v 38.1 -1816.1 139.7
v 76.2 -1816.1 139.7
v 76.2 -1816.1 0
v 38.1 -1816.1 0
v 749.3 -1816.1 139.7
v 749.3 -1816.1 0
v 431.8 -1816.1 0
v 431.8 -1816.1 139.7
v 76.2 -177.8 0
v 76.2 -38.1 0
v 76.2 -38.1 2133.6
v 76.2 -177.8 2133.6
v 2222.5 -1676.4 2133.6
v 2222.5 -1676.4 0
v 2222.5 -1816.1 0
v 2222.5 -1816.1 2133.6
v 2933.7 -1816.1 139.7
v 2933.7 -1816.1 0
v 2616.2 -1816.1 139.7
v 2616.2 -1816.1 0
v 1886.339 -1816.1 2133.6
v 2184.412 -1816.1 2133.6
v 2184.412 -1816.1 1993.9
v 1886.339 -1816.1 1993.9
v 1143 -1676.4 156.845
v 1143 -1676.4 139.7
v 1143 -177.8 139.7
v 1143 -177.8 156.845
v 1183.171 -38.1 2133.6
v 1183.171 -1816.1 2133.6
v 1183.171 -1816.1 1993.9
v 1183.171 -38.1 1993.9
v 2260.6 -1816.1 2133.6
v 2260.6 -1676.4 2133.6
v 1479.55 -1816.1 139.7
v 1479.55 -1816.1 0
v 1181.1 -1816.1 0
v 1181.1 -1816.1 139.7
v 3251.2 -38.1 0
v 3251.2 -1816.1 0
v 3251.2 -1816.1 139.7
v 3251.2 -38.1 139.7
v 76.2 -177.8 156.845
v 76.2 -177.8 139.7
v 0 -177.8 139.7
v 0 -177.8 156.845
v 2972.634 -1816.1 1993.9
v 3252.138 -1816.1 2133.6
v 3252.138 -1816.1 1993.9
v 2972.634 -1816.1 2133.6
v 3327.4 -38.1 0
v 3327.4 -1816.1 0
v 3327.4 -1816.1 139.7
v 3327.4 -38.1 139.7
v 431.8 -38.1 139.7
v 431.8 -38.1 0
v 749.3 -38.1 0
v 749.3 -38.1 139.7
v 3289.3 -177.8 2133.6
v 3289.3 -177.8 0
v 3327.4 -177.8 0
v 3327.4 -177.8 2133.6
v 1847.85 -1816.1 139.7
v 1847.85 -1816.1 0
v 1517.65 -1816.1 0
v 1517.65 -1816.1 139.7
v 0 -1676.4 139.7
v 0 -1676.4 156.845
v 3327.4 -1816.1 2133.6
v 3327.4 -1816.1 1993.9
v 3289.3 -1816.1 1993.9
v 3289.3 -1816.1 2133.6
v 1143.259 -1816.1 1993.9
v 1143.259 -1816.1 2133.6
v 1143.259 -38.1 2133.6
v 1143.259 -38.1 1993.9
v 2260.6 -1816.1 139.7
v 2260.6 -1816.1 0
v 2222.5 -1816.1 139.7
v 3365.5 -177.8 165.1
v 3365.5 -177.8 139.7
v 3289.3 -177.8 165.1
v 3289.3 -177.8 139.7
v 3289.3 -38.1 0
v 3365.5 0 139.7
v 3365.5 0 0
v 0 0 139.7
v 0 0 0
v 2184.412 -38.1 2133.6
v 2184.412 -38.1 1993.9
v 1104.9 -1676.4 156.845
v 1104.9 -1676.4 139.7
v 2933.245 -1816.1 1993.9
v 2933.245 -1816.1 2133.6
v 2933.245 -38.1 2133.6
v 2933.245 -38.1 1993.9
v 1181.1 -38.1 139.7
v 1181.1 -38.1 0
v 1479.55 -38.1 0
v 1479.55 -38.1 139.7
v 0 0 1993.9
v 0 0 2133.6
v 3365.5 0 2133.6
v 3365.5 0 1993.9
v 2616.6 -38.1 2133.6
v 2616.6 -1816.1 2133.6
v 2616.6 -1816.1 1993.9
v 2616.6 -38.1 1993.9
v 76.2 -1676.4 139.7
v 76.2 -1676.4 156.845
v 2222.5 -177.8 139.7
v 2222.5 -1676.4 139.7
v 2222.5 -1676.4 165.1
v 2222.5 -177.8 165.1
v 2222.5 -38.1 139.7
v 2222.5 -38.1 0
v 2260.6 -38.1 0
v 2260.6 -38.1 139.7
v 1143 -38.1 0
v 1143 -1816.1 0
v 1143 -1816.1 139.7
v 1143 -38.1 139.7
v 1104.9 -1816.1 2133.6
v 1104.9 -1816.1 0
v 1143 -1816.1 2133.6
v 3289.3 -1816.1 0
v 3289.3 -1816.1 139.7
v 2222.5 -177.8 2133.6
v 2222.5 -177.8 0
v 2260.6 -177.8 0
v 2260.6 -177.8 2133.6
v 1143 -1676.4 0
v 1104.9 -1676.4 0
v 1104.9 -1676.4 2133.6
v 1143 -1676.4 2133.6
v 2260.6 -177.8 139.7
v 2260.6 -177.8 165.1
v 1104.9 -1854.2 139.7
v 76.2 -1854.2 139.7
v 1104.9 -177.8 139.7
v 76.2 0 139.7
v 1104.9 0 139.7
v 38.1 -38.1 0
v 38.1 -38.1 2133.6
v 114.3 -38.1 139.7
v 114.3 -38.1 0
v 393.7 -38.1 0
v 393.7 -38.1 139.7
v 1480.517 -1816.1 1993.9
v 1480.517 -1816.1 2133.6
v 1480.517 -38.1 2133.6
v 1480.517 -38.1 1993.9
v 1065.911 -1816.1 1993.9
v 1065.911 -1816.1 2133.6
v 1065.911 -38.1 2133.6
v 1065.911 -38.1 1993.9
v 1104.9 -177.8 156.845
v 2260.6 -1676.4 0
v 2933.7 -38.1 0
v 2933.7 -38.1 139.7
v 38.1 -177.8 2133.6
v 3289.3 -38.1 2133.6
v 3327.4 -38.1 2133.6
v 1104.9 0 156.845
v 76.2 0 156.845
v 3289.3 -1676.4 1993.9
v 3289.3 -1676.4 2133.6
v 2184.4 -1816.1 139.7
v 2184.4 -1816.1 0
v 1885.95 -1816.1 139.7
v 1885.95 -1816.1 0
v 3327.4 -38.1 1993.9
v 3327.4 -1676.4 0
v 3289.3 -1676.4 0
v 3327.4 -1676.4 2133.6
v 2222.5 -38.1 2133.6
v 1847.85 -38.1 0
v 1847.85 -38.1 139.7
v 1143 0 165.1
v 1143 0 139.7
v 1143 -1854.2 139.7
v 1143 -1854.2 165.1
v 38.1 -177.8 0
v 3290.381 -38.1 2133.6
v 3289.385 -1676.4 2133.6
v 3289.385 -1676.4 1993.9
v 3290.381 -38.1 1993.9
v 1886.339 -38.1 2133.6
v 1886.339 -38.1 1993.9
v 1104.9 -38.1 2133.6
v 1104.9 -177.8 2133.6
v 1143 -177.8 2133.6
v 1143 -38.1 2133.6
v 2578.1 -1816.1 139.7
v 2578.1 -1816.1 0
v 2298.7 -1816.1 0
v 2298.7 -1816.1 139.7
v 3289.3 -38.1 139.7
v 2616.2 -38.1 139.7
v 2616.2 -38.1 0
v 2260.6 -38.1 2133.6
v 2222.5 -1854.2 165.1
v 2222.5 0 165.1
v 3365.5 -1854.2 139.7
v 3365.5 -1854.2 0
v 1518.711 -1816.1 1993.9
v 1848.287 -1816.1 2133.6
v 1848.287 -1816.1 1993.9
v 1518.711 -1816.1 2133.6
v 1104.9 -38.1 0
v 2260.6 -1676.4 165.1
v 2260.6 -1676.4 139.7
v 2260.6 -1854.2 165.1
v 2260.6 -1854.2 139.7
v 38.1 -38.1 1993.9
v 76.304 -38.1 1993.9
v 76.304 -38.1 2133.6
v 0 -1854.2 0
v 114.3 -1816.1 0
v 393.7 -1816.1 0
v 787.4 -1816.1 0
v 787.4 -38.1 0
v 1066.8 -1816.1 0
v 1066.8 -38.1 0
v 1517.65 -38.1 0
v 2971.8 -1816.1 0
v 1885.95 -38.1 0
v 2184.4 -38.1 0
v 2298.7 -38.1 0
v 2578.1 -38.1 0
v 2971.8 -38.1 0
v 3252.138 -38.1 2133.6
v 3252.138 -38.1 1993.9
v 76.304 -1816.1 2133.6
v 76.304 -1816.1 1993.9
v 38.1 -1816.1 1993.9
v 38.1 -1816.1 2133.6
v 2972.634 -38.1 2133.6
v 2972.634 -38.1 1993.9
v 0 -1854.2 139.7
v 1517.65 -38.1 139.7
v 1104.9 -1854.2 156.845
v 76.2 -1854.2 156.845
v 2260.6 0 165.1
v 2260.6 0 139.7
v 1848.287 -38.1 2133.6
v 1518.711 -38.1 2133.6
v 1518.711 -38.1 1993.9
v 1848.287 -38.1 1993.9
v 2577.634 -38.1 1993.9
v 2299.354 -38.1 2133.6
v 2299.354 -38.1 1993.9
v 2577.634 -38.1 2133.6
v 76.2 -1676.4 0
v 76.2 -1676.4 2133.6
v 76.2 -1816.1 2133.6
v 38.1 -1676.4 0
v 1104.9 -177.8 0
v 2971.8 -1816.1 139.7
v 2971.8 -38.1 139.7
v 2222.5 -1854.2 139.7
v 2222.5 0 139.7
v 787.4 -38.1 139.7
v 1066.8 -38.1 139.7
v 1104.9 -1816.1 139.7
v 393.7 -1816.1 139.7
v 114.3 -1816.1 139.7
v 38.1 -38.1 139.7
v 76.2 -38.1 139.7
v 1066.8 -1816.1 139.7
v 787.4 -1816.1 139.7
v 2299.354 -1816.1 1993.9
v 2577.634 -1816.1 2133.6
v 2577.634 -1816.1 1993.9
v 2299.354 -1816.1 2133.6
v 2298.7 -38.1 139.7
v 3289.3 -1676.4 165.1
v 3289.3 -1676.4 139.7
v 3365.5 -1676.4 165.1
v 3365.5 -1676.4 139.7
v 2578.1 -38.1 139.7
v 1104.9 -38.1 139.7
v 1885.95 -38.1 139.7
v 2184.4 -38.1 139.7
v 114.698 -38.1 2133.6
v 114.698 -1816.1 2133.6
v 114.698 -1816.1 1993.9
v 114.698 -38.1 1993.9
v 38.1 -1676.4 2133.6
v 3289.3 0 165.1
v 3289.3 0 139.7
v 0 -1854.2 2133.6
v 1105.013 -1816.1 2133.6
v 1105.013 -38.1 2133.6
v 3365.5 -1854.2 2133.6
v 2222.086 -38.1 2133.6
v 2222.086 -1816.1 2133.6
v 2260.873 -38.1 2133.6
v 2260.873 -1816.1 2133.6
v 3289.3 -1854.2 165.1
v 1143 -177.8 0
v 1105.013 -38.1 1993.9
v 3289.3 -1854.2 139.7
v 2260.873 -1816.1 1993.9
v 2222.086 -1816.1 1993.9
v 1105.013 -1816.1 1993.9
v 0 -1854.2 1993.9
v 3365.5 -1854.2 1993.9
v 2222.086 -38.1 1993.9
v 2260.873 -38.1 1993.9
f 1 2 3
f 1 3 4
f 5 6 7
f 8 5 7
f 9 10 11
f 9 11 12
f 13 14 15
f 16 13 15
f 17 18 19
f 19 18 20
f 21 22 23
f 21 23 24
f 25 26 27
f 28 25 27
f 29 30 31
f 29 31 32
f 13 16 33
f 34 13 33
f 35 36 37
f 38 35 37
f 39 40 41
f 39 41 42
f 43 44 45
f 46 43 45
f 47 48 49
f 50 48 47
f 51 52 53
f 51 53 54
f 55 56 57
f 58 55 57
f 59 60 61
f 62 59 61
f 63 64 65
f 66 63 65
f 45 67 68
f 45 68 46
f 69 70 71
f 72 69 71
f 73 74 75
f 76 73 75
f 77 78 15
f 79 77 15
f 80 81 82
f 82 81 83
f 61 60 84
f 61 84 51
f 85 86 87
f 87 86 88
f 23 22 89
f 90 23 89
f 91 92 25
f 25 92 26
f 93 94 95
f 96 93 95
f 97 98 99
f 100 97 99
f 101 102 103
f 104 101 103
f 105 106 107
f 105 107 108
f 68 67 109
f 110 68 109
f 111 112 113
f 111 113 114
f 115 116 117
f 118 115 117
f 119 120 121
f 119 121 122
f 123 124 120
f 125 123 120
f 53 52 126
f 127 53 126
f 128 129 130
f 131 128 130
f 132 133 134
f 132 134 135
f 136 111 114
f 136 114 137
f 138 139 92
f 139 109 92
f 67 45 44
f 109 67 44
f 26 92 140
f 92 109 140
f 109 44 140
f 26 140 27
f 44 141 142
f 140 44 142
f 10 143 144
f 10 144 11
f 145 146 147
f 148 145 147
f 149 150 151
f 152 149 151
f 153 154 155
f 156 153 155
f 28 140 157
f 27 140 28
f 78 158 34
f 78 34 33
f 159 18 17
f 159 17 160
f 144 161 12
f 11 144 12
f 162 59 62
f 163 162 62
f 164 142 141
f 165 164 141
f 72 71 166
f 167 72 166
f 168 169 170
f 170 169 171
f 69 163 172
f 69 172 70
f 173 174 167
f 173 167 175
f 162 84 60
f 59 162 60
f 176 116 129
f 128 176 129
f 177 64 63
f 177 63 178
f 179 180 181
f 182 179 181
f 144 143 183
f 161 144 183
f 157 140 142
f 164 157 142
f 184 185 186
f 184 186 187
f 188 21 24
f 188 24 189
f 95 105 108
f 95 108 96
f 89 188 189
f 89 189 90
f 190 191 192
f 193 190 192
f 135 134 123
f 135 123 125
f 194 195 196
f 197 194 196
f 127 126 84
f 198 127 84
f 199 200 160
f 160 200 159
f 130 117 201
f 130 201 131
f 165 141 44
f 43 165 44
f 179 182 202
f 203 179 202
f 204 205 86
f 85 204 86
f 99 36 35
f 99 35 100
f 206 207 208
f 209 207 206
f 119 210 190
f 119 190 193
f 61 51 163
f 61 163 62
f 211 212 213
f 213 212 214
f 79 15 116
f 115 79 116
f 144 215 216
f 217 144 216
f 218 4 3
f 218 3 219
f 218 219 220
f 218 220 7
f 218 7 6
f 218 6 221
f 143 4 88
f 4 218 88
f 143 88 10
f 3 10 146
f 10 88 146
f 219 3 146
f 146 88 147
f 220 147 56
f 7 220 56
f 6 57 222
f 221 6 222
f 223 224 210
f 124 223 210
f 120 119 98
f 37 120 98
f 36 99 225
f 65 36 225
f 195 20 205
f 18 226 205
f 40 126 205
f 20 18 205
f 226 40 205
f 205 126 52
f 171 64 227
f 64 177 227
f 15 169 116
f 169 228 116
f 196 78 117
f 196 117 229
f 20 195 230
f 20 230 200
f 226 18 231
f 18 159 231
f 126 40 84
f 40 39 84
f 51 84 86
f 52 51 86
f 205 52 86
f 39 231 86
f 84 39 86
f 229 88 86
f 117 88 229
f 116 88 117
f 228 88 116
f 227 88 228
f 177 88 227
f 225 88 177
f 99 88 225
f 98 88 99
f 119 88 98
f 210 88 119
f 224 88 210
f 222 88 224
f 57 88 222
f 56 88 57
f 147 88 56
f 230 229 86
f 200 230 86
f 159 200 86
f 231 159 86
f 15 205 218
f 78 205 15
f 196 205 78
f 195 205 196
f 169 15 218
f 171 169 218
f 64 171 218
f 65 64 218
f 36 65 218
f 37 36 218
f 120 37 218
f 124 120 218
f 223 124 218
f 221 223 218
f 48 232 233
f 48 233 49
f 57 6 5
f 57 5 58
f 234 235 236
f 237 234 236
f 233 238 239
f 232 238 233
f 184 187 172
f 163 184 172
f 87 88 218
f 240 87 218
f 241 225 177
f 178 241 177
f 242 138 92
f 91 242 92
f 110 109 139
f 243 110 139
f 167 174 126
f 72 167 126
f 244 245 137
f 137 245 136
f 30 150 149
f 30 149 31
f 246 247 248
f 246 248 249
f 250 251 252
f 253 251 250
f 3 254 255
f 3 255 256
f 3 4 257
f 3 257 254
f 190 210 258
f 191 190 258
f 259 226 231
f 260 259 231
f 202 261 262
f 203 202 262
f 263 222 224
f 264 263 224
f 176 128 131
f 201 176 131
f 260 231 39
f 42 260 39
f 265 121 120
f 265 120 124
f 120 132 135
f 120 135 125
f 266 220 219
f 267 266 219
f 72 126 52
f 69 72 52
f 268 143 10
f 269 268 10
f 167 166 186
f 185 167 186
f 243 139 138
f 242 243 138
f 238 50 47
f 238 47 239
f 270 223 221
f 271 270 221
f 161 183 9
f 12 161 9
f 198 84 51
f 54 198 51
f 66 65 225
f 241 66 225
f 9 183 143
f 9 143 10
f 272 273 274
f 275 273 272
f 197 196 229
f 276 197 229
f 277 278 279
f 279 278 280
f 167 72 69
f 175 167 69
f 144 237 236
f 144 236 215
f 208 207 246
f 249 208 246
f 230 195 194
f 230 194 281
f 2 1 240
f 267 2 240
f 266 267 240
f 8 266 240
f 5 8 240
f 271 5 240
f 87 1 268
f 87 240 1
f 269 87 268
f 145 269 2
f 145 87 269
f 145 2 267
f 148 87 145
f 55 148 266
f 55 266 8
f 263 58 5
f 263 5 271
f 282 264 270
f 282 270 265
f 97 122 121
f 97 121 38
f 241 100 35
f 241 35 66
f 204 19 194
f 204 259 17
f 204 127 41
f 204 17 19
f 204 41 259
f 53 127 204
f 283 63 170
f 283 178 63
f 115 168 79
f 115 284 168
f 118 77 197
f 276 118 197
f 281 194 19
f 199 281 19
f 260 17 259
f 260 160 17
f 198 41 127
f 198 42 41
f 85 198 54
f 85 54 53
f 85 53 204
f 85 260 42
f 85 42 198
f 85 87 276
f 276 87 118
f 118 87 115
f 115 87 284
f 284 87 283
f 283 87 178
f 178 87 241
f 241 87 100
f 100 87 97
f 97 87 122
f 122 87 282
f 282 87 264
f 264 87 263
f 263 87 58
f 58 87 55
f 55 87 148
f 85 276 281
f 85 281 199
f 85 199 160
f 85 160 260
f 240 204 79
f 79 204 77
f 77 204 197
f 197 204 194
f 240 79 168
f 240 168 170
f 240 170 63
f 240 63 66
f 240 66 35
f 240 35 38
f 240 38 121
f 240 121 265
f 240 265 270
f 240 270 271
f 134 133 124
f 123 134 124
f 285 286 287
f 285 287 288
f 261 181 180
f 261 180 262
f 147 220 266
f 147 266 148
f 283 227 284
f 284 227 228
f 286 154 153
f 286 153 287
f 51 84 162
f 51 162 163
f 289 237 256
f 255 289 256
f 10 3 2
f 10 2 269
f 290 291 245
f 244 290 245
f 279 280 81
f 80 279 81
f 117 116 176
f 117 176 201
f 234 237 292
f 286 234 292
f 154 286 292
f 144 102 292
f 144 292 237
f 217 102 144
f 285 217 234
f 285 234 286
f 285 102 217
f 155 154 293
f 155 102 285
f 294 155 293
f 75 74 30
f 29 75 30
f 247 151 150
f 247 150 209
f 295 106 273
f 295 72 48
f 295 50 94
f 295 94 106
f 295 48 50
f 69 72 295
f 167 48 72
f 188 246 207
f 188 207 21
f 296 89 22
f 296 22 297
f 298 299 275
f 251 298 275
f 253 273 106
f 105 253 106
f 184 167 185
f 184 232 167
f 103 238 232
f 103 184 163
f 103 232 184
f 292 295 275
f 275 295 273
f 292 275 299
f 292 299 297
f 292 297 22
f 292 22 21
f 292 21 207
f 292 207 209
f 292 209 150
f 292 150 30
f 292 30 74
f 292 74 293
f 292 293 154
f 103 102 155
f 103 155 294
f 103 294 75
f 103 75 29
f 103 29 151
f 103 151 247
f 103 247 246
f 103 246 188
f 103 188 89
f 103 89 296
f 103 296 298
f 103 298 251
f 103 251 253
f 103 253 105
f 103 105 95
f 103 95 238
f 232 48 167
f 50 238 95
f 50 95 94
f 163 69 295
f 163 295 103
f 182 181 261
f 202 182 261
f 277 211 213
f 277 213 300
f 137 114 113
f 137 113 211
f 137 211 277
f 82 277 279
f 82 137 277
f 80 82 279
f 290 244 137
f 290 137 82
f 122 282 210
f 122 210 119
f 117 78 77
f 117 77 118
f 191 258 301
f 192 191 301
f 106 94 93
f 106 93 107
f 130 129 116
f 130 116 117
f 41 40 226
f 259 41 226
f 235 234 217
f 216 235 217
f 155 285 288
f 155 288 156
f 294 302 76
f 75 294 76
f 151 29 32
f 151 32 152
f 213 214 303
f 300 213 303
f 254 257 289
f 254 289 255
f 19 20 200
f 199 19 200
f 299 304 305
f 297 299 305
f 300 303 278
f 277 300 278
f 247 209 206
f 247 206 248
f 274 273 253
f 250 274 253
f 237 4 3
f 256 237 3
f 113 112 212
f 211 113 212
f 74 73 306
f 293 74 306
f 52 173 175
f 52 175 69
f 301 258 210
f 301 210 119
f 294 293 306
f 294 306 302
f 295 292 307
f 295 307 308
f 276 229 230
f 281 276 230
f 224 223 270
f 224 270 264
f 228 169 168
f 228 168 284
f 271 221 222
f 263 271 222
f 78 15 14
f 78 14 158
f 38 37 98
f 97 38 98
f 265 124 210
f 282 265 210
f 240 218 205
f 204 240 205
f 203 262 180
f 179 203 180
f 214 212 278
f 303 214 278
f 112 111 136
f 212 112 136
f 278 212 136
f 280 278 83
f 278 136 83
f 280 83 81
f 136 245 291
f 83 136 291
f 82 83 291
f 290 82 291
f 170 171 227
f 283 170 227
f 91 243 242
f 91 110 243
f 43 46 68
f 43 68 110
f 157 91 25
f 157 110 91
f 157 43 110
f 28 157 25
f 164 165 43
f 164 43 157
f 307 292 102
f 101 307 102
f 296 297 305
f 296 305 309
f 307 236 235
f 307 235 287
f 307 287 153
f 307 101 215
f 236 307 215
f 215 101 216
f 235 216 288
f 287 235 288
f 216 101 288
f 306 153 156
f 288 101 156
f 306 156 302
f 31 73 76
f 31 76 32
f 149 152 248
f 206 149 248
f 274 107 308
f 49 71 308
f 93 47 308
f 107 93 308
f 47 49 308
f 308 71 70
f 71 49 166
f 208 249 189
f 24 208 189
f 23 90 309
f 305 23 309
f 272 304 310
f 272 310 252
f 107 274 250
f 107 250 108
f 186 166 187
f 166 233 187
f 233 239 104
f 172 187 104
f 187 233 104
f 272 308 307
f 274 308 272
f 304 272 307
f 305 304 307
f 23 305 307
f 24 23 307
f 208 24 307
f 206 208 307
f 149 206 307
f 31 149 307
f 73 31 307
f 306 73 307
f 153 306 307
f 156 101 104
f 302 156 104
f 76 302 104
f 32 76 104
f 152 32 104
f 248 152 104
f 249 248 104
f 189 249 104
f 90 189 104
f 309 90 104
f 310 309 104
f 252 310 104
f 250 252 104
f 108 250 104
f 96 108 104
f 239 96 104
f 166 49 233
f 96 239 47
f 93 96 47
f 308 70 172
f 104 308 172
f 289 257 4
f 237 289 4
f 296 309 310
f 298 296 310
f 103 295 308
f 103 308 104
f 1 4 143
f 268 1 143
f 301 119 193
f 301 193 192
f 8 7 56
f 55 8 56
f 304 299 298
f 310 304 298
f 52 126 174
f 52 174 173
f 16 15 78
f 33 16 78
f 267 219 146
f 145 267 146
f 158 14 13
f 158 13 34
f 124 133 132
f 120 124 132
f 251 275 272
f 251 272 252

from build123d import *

# Parameters (mm, degrees)
F0_W     = 38.1
F0_H     = 1778
F1_DEPTH = 139.7
F2_W     = 38.1
F2_H     = 139.7
F3_DEPTH = 2133.6
F4_W     = 3365.5
F4_H     = 1854.2
F4_W_2   = 39.3888950348
F4_H_2   = 1778
F4_W_3   = 38.9654636383
F4_W_4   = 38.4805202484
F4_W_5   = 37.6737117767
F4_W_6   = 38.0517244339
F4_W_7   = 38.1945371628
F4_W_8   = 39.9121046066
F4_W_9   = 39.1020178795
F4_W_10  = 38.3940786123
F5_DEPTH = 139.7
F6_W     = 279.4
F6_H     = 1778
F6_W_2   = 317.5
F6_W_3   = 38.1
F6_H_2   = 1498.6
F7_DEPTH = 17.145
F6_W_4   = 298.45
F6_W_5   = 330.2
F8_DEPTH = 25.4
F9_DEPTH = 25.4


with BuildPart() as f1:
    # F0 (on Top) → F1 (new body)
    with BuildSketch(Plane.XY):
        Polygon((3365.5, 0), (0, 0), (0, -38.1), (38.1, -38.1), (76.2, -38.1), (114.3, -38.1), (393.7, -38.1), (431.8, -38.1), (749.3, -38.1), (787.4, -38.1), (1066.8, -38.1), (1104.9, -38.1), (1143, -38.1), (1181.1, -38.1), (1479.55, -38.1), (1517.65, -38.1), (1847.85, -38.1), (1885.95, -38.1), (2184.4, -38.1), (2222.5, -38.1), (2260.6, -38.1), (2298.7, -38.1), (2578.1, -38.1), (2616.2, -38.1), (2933.7, -38.1), (2971.8, -38.1), (3251.2, -38.1), (3289.3, -38.1), (3327.4, -38.1), (3365.5, -38.1), align=None)
        with Locations((3346.45, -927.1)):
            Rectangle(F0_W, F0_H)
        with Locations((3270.25, -927.1)):
            Rectangle(F0_W, F0_H)
        Polygon((38.1, -1816.1), (0, -1816.1), (0, -1854.2), (3365.5, -1854.2), (3365.5, -1816.1), (3327.4, -1816.1), (3289.3, -1816.1), (3251.2, -1816.1), (2971.8, -1816.1), (2933.7, -1816.1), (2616.2, -1816.1), (2578.1, -1816.1), (2298.7, -1816.1), (2260.6, -1816.1), (2222.5, -1816.1), (2184.4, -1816.1), (1885.95, -1816.1), (1847.85, -1816.1), (1517.65, -1816.1), (1479.55, -1816.1), (1181.1, -1816.1), (1143, -1816.1), (1104.9, -1816.1), (1066.8, -1816.1), (787.4, -1816.1), (749.3, -1816.1), (431.8, -1816.1), (393.7, -1816.1), (114.3, -1816.1), (76.2, -1816.1), align=None)
        with Locations((19.05, -927.1)):
            Rectangle(F0_W, F0_H)
        with Locations((95.25, -927.1)):
            Rectangle(F0_W, F0_H)
        with Locations((1085.85, -927.1)):
            Rectangle(F0_W, F0_H)
        with Locations((1162.05, -927.1)):
            Rectangle(F0_W, F0_H)
        with Locations((2203.45, -927.1)):
            Rectangle(F0_W, F0_H)
        with Locations((2279.65, -927.1)):
            Rectangle(F0_W, F0_H)
        with Locations((412.75, -927.1)):
            Rectangle(F0_W, F0_H)
        with Locations((768.35, -927.1)):
            Rectangle(F0_W, F0_H)
        with Locations((1498.6, -927.1)):
            Rectangle(F0_W, F0_H)
        with Locations((1866.9, -927.1)):
            Rectangle(F0_W, F0_H)
        with Locations((2597.15, -927.1)):
            Rectangle(F0_W, F0_H)
        with Locations((2952.75, -927.1)):
            Rectangle(F0_W, F0_H)
    extrude(amount=F1_DEPTH)


with BuildPart() as f3:
    # F2 (on face) → F3 (new body)
    with BuildSketch(Plane(origin=(0, 0, 0), x_dir=(1, 0, 0), z_dir=(0, 0, -1))):
        with Locations((57.15, 107.95)):
            Rectangle(F2_W, F2_H)
    extrude(amount=-F3_DEPTH)


with BuildPart() as f3b:
    # F2 (on face) → F3, piece 2 (new body)
    with BuildSketch(Plane(origin=(0, 0, 0), x_dir=(1, 0, 0), z_dir=(0, 0, -1))):
        with Locations((1123.95, 107.95)):
            Rectangle(F2_W, F2_H)
    extrude(amount=-F3_DEPTH)


with BuildPart() as f3c:
    # F2 (on face) → F3, piece 3 (new body)
    with BuildSketch(Plane(origin=(0, 0, 0), x_dir=(1, 0, 0), z_dir=(0, 0, -1))):
        with Locations((2241.55, 107.95)):
            Rectangle(F2_W, F2_H)
    extrude(amount=-F3_DEPTH)


with BuildPart() as f3d:
    # F2 (on face) → F3, piece 4 (new body)
    with BuildSketch(Plane(origin=(0, 0, 0), x_dir=(1, 0, 0), z_dir=(0, 0, -1))):
        with Locations((3308.35, 107.95)):
            Rectangle(F2_W, F2_H)
    extrude(amount=-F3_DEPTH)


with BuildPart() as f3e:
    # F2 (on face) → F3, piece 5 (new body)
    with BuildSketch(Plane(origin=(0, 0, 0), x_dir=(1, 0, 0), z_dir=(0, 0, -1))):
        with Locations((57.15, 1746.25)):
            Rectangle(F2_W, F2_H)
    extrude(amount=-F3_DEPTH)


with BuildPart() as f3f:
    # F2 (on face) → F3, piece 6 (new body)
    with BuildSketch(Plane(origin=(0, 0, 0), x_dir=(1, 0, 0), z_dir=(0, 0, -1))):
        with Locations((1123.95, 1746.25)):
            Rectangle(F2_W, F2_H)
    extrude(amount=-F3_DEPTH)


with BuildPart() as f3g:
    # F2 (on face) → F3, piece 7 (new body)
    with BuildSketch(Plane(origin=(0, 0, 0), x_dir=(1, 0, 0), z_dir=(0, 0, -1))):
        with Locations((2241.55, 1746.25)):
            Rectangle(F2_W, F2_H)
    extrude(amount=-F3_DEPTH)


with BuildPart() as f3h:
    # F2 (on face) → F3, piece 8 (new body)
    with BuildSketch(Plane(origin=(0, 0, 0), x_dir=(1, 0, 0), z_dir=(0, 0, -1))):
        with Locations((3308.35, 1746.25)):
            Rectangle(F2_W, F2_H)
    extrude(amount=-F3_DEPTH)


with BuildPart() as f5:
    # F4 (on face) → F5 (new body)
    with BuildSketch(Plane.XY.offset(2133.6)):
        with Locations((1682.75, -927.1)):
            Rectangle(F4_W, F4_H)
        Polygon((3327.4, -38.1), (3327.4, -1816.1), (3289.3, -1816.1), (3252.1376609802, -1816.1), (2972.633600235, -1816.1), (2933.2447052002, -1816.1), (2616.5995597839, -1816.1), (2577.6340961456, -1816.1), (2299.3535995483, -1816.1), (2260.8730792999, -1816.1), (2222.0861911774, -1816.1), (2184.4124794006, -1816.1), (1886.3390684128, -1816.1), (1848.2873439789, -1816.1), (1518.7114477158, -1816.1), (1480.516910553, -1816.1), (1183.1712722778, -1816.1), (1143.2591676712, -1816.1), (1105.0134897232, -1816.1), (1065.9114718437, -1816.1), (114.6984994411, -1816.1), (76.3044208288, -1816.1), (38.1, -1816.1), (38.1, -38.1), (76.3044208288, -38.1), (114.6984994411, -38.1), (1065.9114718437, -38.1), (1105.0134897232, -38.1), (1143.2591676712, -38.1), (1183.1712722778, -38.1), (1480.516910553, -38.1), (1518.7114477158, -38.1), (1848.2873439789, -38.1), (1886.3390684128, -38.1), (2184.4124794006, -38.1), (2222.0861911774, -38.1), (2260.8730792999, -38.1), (2299.3535995483, -38.1), (2577.6340961456, -38.1), (2616.5995597839, -38.1), (2933.2447052002, -38.1), (2972.633600235, -38.1), (3252.1376609802, -38.1), (3290.381193161, -38.1), align=None, mode=Mode.SUBTRACT)
        Polygon((3252.1376609802, -1816.1), (3289.3, -1816.1), (3289.3, -1676.4), (3289.3849508912, -1676.4), (3290.381193161, -38.1), (3252.1376609802, -38.1), align=None)
        with Locations((2952.9391527176, -927.1)):
            Rectangle(F4_W_2, F4_H_2)
        with Locations((2597.1168279648, -927.1)):
            Rectangle(F4_W_3, F4_H_2)
        with Locations((2280.1133394241, -927.1)):
            Rectangle(F4_W_4, F4_H_2)
        with Locations((2203.249335289, -927.1)):
            Rectangle(F4_W_5, F4_H_2)
        with Locations((1867.3132061958, -927.1)):
            Rectangle(F4_W_6, F4_H_2)
        with Locations((1499.6141791344, -927.1)):
            Rectangle(F4_W_7, F4_H_2)
        with Locations((1163.2152199745, -927.1)):
            Rectangle(F4_W_8, F4_H_2)
        with Locations((1085.4624807835, -927.1)):
            Rectangle(F4_W_9, F4_H_2)
        with Locations((95.501460135, -927.1)):
            Rectangle(F4_W_10, F4_H_2)
    extrude(amount=-F5_DEPTH)


with BuildPart() as f7:
    # F6 (on face) → F7 (new body)
    with BuildSketch(Plane.XY.offset(139.7)):
        Polygon((76.2, -38.1), (76.2, -177.8), (76.2, -1676.4), (76.2, -1816.1), (76.2, -1854.2), (1104.9, -1854.2), (1104.9, -1816.1), (1104.9, -1676.4), (1104.9, -177.8), (1104.9, -38.1), (1104.9, 0), (76.2, 0), align=None)
        with Locations((254, -927.1)):
            Rectangle(F6_W, F6_H, mode=Mode.SUBTRACT)
        with Locations((590.55, -927.1)):
            Rectangle(F6_W_2, F6_H, mode=Mode.SUBTRACT)
        with Locations((927.1, -927.1)):
            Rectangle(F6_W, F6_H, mode=Mode.SUBTRACT)
        with Locations((19.05, -927.1)):
            Rectangle(F6_W_3, F6_H_2)
        with Locations((57.15, -927.1)):
            Rectangle(F6_W_3, F6_H_2)
        with Locations((1123.95, -927.1)):
            Rectangle(F6_W_3, F6_H_2)
        with Locations((254, -927.1)):
            Rectangle(F6_W, F6_H)
        with Locations((590.55, -927.1)):
            Rectangle(F6_W_2, F6_H)
        with Locations((927.1, -927.1)):
            Rectangle(F6_W, F6_H)
    extrude(amount=F7_DEPTH)


with BuildPart() as f8:
    # F6 (on face) → F8 (new body)
    with BuildSketch(Plane.XY.offset(139.7)):
        Polygon((2222.5, 0), (1143, 0), (1143, -38.1), (1143, -177.8), (1143, -1676.4), (1143, -1816.1), (1143, -1854.2), (2222.5, -1854.2), (2222.5, -1816.1), (2222.5, -1676.4), (2222.5, -177.8), (2222.5, -38.1), align=None)
        with Locations((1330.325, -927.1)):
            Rectangle(F6_W_4, F6_H, mode=Mode.SUBTRACT)
        with Locations((1682.75, -927.1)):
            Rectangle(F6_W_5, F6_H, mode=Mode.SUBTRACT)
        with Locations((2035.175, -927.1)):
            Rectangle(F6_W_4, F6_H, mode=Mode.SUBTRACT)
        with Locations((1330.325, -927.1)):
            Rectangle(F6_W_4, F6_H)
        with Locations((1682.75, -927.1)):
            Rectangle(F6_W_5, F6_H)
        with Locations((2035.175, -927.1)):
            Rectangle(F6_W_4, F6_H)
    extrude(amount=F8_DEPTH)


with BuildPart() as f9:
    # F6 (on face) → F9 (new body)
    with BuildSketch(Plane.XY.offset(139.7)):
        with Locations((2241.55, -927.1)):
            Rectangle(F6_W_3, F6_H_2)
        Polygon((3289.3, 0), (2260.6, 0), (2260.6, -38.1), (2260.6, -177.8), (2260.6, -1676.4), (2260.6, -1816.1), (2260.6, -1854.2), (3289.3, -1854.2), (3289.3, -1816.1), (3289.3, -1676.4), (3289.3, -177.8), (3289.3, -38.1), align=None)
        with Locations((2438.4, -927.1)):
            Rectangle(F6_W, F6_H, mode=Mode.SUBTRACT)
        with Locations((2774.95, -927.1)):
            Rectangle(F6_W_2, F6_H, mode=Mode.SUBTRACT)
        with Locations((3111.5, -927.1)):
            Rectangle(F6_W, F6_H, mode=Mode.SUBTRACT)
        with Locations((2438.4, -927.1)):
            Rectangle(F6_W, F6_H)
        with Locations((2774.95, -927.1)):
            Rectangle(F6_W_2, F6_H)
        with Locations((3111.5, -927.1)):
            Rectangle(F6_W, F6_H)
        with Locations((3346.45, -927.1)):
            Rectangle(F6_W_3, F6_H_2)
        with Locations((3308.35, -927.1)):
            Rectangle(F6_W_3, F6_H_2)
    extrude(amount=F9_DEPTH)


solid = Compound([f1.part, f3.part, f3b.part, f3c.part, f3d.part, f3e.part, f3f.part, f3g.part, f3h.part, f5.part, f7.part, f8.part, f9.part])
